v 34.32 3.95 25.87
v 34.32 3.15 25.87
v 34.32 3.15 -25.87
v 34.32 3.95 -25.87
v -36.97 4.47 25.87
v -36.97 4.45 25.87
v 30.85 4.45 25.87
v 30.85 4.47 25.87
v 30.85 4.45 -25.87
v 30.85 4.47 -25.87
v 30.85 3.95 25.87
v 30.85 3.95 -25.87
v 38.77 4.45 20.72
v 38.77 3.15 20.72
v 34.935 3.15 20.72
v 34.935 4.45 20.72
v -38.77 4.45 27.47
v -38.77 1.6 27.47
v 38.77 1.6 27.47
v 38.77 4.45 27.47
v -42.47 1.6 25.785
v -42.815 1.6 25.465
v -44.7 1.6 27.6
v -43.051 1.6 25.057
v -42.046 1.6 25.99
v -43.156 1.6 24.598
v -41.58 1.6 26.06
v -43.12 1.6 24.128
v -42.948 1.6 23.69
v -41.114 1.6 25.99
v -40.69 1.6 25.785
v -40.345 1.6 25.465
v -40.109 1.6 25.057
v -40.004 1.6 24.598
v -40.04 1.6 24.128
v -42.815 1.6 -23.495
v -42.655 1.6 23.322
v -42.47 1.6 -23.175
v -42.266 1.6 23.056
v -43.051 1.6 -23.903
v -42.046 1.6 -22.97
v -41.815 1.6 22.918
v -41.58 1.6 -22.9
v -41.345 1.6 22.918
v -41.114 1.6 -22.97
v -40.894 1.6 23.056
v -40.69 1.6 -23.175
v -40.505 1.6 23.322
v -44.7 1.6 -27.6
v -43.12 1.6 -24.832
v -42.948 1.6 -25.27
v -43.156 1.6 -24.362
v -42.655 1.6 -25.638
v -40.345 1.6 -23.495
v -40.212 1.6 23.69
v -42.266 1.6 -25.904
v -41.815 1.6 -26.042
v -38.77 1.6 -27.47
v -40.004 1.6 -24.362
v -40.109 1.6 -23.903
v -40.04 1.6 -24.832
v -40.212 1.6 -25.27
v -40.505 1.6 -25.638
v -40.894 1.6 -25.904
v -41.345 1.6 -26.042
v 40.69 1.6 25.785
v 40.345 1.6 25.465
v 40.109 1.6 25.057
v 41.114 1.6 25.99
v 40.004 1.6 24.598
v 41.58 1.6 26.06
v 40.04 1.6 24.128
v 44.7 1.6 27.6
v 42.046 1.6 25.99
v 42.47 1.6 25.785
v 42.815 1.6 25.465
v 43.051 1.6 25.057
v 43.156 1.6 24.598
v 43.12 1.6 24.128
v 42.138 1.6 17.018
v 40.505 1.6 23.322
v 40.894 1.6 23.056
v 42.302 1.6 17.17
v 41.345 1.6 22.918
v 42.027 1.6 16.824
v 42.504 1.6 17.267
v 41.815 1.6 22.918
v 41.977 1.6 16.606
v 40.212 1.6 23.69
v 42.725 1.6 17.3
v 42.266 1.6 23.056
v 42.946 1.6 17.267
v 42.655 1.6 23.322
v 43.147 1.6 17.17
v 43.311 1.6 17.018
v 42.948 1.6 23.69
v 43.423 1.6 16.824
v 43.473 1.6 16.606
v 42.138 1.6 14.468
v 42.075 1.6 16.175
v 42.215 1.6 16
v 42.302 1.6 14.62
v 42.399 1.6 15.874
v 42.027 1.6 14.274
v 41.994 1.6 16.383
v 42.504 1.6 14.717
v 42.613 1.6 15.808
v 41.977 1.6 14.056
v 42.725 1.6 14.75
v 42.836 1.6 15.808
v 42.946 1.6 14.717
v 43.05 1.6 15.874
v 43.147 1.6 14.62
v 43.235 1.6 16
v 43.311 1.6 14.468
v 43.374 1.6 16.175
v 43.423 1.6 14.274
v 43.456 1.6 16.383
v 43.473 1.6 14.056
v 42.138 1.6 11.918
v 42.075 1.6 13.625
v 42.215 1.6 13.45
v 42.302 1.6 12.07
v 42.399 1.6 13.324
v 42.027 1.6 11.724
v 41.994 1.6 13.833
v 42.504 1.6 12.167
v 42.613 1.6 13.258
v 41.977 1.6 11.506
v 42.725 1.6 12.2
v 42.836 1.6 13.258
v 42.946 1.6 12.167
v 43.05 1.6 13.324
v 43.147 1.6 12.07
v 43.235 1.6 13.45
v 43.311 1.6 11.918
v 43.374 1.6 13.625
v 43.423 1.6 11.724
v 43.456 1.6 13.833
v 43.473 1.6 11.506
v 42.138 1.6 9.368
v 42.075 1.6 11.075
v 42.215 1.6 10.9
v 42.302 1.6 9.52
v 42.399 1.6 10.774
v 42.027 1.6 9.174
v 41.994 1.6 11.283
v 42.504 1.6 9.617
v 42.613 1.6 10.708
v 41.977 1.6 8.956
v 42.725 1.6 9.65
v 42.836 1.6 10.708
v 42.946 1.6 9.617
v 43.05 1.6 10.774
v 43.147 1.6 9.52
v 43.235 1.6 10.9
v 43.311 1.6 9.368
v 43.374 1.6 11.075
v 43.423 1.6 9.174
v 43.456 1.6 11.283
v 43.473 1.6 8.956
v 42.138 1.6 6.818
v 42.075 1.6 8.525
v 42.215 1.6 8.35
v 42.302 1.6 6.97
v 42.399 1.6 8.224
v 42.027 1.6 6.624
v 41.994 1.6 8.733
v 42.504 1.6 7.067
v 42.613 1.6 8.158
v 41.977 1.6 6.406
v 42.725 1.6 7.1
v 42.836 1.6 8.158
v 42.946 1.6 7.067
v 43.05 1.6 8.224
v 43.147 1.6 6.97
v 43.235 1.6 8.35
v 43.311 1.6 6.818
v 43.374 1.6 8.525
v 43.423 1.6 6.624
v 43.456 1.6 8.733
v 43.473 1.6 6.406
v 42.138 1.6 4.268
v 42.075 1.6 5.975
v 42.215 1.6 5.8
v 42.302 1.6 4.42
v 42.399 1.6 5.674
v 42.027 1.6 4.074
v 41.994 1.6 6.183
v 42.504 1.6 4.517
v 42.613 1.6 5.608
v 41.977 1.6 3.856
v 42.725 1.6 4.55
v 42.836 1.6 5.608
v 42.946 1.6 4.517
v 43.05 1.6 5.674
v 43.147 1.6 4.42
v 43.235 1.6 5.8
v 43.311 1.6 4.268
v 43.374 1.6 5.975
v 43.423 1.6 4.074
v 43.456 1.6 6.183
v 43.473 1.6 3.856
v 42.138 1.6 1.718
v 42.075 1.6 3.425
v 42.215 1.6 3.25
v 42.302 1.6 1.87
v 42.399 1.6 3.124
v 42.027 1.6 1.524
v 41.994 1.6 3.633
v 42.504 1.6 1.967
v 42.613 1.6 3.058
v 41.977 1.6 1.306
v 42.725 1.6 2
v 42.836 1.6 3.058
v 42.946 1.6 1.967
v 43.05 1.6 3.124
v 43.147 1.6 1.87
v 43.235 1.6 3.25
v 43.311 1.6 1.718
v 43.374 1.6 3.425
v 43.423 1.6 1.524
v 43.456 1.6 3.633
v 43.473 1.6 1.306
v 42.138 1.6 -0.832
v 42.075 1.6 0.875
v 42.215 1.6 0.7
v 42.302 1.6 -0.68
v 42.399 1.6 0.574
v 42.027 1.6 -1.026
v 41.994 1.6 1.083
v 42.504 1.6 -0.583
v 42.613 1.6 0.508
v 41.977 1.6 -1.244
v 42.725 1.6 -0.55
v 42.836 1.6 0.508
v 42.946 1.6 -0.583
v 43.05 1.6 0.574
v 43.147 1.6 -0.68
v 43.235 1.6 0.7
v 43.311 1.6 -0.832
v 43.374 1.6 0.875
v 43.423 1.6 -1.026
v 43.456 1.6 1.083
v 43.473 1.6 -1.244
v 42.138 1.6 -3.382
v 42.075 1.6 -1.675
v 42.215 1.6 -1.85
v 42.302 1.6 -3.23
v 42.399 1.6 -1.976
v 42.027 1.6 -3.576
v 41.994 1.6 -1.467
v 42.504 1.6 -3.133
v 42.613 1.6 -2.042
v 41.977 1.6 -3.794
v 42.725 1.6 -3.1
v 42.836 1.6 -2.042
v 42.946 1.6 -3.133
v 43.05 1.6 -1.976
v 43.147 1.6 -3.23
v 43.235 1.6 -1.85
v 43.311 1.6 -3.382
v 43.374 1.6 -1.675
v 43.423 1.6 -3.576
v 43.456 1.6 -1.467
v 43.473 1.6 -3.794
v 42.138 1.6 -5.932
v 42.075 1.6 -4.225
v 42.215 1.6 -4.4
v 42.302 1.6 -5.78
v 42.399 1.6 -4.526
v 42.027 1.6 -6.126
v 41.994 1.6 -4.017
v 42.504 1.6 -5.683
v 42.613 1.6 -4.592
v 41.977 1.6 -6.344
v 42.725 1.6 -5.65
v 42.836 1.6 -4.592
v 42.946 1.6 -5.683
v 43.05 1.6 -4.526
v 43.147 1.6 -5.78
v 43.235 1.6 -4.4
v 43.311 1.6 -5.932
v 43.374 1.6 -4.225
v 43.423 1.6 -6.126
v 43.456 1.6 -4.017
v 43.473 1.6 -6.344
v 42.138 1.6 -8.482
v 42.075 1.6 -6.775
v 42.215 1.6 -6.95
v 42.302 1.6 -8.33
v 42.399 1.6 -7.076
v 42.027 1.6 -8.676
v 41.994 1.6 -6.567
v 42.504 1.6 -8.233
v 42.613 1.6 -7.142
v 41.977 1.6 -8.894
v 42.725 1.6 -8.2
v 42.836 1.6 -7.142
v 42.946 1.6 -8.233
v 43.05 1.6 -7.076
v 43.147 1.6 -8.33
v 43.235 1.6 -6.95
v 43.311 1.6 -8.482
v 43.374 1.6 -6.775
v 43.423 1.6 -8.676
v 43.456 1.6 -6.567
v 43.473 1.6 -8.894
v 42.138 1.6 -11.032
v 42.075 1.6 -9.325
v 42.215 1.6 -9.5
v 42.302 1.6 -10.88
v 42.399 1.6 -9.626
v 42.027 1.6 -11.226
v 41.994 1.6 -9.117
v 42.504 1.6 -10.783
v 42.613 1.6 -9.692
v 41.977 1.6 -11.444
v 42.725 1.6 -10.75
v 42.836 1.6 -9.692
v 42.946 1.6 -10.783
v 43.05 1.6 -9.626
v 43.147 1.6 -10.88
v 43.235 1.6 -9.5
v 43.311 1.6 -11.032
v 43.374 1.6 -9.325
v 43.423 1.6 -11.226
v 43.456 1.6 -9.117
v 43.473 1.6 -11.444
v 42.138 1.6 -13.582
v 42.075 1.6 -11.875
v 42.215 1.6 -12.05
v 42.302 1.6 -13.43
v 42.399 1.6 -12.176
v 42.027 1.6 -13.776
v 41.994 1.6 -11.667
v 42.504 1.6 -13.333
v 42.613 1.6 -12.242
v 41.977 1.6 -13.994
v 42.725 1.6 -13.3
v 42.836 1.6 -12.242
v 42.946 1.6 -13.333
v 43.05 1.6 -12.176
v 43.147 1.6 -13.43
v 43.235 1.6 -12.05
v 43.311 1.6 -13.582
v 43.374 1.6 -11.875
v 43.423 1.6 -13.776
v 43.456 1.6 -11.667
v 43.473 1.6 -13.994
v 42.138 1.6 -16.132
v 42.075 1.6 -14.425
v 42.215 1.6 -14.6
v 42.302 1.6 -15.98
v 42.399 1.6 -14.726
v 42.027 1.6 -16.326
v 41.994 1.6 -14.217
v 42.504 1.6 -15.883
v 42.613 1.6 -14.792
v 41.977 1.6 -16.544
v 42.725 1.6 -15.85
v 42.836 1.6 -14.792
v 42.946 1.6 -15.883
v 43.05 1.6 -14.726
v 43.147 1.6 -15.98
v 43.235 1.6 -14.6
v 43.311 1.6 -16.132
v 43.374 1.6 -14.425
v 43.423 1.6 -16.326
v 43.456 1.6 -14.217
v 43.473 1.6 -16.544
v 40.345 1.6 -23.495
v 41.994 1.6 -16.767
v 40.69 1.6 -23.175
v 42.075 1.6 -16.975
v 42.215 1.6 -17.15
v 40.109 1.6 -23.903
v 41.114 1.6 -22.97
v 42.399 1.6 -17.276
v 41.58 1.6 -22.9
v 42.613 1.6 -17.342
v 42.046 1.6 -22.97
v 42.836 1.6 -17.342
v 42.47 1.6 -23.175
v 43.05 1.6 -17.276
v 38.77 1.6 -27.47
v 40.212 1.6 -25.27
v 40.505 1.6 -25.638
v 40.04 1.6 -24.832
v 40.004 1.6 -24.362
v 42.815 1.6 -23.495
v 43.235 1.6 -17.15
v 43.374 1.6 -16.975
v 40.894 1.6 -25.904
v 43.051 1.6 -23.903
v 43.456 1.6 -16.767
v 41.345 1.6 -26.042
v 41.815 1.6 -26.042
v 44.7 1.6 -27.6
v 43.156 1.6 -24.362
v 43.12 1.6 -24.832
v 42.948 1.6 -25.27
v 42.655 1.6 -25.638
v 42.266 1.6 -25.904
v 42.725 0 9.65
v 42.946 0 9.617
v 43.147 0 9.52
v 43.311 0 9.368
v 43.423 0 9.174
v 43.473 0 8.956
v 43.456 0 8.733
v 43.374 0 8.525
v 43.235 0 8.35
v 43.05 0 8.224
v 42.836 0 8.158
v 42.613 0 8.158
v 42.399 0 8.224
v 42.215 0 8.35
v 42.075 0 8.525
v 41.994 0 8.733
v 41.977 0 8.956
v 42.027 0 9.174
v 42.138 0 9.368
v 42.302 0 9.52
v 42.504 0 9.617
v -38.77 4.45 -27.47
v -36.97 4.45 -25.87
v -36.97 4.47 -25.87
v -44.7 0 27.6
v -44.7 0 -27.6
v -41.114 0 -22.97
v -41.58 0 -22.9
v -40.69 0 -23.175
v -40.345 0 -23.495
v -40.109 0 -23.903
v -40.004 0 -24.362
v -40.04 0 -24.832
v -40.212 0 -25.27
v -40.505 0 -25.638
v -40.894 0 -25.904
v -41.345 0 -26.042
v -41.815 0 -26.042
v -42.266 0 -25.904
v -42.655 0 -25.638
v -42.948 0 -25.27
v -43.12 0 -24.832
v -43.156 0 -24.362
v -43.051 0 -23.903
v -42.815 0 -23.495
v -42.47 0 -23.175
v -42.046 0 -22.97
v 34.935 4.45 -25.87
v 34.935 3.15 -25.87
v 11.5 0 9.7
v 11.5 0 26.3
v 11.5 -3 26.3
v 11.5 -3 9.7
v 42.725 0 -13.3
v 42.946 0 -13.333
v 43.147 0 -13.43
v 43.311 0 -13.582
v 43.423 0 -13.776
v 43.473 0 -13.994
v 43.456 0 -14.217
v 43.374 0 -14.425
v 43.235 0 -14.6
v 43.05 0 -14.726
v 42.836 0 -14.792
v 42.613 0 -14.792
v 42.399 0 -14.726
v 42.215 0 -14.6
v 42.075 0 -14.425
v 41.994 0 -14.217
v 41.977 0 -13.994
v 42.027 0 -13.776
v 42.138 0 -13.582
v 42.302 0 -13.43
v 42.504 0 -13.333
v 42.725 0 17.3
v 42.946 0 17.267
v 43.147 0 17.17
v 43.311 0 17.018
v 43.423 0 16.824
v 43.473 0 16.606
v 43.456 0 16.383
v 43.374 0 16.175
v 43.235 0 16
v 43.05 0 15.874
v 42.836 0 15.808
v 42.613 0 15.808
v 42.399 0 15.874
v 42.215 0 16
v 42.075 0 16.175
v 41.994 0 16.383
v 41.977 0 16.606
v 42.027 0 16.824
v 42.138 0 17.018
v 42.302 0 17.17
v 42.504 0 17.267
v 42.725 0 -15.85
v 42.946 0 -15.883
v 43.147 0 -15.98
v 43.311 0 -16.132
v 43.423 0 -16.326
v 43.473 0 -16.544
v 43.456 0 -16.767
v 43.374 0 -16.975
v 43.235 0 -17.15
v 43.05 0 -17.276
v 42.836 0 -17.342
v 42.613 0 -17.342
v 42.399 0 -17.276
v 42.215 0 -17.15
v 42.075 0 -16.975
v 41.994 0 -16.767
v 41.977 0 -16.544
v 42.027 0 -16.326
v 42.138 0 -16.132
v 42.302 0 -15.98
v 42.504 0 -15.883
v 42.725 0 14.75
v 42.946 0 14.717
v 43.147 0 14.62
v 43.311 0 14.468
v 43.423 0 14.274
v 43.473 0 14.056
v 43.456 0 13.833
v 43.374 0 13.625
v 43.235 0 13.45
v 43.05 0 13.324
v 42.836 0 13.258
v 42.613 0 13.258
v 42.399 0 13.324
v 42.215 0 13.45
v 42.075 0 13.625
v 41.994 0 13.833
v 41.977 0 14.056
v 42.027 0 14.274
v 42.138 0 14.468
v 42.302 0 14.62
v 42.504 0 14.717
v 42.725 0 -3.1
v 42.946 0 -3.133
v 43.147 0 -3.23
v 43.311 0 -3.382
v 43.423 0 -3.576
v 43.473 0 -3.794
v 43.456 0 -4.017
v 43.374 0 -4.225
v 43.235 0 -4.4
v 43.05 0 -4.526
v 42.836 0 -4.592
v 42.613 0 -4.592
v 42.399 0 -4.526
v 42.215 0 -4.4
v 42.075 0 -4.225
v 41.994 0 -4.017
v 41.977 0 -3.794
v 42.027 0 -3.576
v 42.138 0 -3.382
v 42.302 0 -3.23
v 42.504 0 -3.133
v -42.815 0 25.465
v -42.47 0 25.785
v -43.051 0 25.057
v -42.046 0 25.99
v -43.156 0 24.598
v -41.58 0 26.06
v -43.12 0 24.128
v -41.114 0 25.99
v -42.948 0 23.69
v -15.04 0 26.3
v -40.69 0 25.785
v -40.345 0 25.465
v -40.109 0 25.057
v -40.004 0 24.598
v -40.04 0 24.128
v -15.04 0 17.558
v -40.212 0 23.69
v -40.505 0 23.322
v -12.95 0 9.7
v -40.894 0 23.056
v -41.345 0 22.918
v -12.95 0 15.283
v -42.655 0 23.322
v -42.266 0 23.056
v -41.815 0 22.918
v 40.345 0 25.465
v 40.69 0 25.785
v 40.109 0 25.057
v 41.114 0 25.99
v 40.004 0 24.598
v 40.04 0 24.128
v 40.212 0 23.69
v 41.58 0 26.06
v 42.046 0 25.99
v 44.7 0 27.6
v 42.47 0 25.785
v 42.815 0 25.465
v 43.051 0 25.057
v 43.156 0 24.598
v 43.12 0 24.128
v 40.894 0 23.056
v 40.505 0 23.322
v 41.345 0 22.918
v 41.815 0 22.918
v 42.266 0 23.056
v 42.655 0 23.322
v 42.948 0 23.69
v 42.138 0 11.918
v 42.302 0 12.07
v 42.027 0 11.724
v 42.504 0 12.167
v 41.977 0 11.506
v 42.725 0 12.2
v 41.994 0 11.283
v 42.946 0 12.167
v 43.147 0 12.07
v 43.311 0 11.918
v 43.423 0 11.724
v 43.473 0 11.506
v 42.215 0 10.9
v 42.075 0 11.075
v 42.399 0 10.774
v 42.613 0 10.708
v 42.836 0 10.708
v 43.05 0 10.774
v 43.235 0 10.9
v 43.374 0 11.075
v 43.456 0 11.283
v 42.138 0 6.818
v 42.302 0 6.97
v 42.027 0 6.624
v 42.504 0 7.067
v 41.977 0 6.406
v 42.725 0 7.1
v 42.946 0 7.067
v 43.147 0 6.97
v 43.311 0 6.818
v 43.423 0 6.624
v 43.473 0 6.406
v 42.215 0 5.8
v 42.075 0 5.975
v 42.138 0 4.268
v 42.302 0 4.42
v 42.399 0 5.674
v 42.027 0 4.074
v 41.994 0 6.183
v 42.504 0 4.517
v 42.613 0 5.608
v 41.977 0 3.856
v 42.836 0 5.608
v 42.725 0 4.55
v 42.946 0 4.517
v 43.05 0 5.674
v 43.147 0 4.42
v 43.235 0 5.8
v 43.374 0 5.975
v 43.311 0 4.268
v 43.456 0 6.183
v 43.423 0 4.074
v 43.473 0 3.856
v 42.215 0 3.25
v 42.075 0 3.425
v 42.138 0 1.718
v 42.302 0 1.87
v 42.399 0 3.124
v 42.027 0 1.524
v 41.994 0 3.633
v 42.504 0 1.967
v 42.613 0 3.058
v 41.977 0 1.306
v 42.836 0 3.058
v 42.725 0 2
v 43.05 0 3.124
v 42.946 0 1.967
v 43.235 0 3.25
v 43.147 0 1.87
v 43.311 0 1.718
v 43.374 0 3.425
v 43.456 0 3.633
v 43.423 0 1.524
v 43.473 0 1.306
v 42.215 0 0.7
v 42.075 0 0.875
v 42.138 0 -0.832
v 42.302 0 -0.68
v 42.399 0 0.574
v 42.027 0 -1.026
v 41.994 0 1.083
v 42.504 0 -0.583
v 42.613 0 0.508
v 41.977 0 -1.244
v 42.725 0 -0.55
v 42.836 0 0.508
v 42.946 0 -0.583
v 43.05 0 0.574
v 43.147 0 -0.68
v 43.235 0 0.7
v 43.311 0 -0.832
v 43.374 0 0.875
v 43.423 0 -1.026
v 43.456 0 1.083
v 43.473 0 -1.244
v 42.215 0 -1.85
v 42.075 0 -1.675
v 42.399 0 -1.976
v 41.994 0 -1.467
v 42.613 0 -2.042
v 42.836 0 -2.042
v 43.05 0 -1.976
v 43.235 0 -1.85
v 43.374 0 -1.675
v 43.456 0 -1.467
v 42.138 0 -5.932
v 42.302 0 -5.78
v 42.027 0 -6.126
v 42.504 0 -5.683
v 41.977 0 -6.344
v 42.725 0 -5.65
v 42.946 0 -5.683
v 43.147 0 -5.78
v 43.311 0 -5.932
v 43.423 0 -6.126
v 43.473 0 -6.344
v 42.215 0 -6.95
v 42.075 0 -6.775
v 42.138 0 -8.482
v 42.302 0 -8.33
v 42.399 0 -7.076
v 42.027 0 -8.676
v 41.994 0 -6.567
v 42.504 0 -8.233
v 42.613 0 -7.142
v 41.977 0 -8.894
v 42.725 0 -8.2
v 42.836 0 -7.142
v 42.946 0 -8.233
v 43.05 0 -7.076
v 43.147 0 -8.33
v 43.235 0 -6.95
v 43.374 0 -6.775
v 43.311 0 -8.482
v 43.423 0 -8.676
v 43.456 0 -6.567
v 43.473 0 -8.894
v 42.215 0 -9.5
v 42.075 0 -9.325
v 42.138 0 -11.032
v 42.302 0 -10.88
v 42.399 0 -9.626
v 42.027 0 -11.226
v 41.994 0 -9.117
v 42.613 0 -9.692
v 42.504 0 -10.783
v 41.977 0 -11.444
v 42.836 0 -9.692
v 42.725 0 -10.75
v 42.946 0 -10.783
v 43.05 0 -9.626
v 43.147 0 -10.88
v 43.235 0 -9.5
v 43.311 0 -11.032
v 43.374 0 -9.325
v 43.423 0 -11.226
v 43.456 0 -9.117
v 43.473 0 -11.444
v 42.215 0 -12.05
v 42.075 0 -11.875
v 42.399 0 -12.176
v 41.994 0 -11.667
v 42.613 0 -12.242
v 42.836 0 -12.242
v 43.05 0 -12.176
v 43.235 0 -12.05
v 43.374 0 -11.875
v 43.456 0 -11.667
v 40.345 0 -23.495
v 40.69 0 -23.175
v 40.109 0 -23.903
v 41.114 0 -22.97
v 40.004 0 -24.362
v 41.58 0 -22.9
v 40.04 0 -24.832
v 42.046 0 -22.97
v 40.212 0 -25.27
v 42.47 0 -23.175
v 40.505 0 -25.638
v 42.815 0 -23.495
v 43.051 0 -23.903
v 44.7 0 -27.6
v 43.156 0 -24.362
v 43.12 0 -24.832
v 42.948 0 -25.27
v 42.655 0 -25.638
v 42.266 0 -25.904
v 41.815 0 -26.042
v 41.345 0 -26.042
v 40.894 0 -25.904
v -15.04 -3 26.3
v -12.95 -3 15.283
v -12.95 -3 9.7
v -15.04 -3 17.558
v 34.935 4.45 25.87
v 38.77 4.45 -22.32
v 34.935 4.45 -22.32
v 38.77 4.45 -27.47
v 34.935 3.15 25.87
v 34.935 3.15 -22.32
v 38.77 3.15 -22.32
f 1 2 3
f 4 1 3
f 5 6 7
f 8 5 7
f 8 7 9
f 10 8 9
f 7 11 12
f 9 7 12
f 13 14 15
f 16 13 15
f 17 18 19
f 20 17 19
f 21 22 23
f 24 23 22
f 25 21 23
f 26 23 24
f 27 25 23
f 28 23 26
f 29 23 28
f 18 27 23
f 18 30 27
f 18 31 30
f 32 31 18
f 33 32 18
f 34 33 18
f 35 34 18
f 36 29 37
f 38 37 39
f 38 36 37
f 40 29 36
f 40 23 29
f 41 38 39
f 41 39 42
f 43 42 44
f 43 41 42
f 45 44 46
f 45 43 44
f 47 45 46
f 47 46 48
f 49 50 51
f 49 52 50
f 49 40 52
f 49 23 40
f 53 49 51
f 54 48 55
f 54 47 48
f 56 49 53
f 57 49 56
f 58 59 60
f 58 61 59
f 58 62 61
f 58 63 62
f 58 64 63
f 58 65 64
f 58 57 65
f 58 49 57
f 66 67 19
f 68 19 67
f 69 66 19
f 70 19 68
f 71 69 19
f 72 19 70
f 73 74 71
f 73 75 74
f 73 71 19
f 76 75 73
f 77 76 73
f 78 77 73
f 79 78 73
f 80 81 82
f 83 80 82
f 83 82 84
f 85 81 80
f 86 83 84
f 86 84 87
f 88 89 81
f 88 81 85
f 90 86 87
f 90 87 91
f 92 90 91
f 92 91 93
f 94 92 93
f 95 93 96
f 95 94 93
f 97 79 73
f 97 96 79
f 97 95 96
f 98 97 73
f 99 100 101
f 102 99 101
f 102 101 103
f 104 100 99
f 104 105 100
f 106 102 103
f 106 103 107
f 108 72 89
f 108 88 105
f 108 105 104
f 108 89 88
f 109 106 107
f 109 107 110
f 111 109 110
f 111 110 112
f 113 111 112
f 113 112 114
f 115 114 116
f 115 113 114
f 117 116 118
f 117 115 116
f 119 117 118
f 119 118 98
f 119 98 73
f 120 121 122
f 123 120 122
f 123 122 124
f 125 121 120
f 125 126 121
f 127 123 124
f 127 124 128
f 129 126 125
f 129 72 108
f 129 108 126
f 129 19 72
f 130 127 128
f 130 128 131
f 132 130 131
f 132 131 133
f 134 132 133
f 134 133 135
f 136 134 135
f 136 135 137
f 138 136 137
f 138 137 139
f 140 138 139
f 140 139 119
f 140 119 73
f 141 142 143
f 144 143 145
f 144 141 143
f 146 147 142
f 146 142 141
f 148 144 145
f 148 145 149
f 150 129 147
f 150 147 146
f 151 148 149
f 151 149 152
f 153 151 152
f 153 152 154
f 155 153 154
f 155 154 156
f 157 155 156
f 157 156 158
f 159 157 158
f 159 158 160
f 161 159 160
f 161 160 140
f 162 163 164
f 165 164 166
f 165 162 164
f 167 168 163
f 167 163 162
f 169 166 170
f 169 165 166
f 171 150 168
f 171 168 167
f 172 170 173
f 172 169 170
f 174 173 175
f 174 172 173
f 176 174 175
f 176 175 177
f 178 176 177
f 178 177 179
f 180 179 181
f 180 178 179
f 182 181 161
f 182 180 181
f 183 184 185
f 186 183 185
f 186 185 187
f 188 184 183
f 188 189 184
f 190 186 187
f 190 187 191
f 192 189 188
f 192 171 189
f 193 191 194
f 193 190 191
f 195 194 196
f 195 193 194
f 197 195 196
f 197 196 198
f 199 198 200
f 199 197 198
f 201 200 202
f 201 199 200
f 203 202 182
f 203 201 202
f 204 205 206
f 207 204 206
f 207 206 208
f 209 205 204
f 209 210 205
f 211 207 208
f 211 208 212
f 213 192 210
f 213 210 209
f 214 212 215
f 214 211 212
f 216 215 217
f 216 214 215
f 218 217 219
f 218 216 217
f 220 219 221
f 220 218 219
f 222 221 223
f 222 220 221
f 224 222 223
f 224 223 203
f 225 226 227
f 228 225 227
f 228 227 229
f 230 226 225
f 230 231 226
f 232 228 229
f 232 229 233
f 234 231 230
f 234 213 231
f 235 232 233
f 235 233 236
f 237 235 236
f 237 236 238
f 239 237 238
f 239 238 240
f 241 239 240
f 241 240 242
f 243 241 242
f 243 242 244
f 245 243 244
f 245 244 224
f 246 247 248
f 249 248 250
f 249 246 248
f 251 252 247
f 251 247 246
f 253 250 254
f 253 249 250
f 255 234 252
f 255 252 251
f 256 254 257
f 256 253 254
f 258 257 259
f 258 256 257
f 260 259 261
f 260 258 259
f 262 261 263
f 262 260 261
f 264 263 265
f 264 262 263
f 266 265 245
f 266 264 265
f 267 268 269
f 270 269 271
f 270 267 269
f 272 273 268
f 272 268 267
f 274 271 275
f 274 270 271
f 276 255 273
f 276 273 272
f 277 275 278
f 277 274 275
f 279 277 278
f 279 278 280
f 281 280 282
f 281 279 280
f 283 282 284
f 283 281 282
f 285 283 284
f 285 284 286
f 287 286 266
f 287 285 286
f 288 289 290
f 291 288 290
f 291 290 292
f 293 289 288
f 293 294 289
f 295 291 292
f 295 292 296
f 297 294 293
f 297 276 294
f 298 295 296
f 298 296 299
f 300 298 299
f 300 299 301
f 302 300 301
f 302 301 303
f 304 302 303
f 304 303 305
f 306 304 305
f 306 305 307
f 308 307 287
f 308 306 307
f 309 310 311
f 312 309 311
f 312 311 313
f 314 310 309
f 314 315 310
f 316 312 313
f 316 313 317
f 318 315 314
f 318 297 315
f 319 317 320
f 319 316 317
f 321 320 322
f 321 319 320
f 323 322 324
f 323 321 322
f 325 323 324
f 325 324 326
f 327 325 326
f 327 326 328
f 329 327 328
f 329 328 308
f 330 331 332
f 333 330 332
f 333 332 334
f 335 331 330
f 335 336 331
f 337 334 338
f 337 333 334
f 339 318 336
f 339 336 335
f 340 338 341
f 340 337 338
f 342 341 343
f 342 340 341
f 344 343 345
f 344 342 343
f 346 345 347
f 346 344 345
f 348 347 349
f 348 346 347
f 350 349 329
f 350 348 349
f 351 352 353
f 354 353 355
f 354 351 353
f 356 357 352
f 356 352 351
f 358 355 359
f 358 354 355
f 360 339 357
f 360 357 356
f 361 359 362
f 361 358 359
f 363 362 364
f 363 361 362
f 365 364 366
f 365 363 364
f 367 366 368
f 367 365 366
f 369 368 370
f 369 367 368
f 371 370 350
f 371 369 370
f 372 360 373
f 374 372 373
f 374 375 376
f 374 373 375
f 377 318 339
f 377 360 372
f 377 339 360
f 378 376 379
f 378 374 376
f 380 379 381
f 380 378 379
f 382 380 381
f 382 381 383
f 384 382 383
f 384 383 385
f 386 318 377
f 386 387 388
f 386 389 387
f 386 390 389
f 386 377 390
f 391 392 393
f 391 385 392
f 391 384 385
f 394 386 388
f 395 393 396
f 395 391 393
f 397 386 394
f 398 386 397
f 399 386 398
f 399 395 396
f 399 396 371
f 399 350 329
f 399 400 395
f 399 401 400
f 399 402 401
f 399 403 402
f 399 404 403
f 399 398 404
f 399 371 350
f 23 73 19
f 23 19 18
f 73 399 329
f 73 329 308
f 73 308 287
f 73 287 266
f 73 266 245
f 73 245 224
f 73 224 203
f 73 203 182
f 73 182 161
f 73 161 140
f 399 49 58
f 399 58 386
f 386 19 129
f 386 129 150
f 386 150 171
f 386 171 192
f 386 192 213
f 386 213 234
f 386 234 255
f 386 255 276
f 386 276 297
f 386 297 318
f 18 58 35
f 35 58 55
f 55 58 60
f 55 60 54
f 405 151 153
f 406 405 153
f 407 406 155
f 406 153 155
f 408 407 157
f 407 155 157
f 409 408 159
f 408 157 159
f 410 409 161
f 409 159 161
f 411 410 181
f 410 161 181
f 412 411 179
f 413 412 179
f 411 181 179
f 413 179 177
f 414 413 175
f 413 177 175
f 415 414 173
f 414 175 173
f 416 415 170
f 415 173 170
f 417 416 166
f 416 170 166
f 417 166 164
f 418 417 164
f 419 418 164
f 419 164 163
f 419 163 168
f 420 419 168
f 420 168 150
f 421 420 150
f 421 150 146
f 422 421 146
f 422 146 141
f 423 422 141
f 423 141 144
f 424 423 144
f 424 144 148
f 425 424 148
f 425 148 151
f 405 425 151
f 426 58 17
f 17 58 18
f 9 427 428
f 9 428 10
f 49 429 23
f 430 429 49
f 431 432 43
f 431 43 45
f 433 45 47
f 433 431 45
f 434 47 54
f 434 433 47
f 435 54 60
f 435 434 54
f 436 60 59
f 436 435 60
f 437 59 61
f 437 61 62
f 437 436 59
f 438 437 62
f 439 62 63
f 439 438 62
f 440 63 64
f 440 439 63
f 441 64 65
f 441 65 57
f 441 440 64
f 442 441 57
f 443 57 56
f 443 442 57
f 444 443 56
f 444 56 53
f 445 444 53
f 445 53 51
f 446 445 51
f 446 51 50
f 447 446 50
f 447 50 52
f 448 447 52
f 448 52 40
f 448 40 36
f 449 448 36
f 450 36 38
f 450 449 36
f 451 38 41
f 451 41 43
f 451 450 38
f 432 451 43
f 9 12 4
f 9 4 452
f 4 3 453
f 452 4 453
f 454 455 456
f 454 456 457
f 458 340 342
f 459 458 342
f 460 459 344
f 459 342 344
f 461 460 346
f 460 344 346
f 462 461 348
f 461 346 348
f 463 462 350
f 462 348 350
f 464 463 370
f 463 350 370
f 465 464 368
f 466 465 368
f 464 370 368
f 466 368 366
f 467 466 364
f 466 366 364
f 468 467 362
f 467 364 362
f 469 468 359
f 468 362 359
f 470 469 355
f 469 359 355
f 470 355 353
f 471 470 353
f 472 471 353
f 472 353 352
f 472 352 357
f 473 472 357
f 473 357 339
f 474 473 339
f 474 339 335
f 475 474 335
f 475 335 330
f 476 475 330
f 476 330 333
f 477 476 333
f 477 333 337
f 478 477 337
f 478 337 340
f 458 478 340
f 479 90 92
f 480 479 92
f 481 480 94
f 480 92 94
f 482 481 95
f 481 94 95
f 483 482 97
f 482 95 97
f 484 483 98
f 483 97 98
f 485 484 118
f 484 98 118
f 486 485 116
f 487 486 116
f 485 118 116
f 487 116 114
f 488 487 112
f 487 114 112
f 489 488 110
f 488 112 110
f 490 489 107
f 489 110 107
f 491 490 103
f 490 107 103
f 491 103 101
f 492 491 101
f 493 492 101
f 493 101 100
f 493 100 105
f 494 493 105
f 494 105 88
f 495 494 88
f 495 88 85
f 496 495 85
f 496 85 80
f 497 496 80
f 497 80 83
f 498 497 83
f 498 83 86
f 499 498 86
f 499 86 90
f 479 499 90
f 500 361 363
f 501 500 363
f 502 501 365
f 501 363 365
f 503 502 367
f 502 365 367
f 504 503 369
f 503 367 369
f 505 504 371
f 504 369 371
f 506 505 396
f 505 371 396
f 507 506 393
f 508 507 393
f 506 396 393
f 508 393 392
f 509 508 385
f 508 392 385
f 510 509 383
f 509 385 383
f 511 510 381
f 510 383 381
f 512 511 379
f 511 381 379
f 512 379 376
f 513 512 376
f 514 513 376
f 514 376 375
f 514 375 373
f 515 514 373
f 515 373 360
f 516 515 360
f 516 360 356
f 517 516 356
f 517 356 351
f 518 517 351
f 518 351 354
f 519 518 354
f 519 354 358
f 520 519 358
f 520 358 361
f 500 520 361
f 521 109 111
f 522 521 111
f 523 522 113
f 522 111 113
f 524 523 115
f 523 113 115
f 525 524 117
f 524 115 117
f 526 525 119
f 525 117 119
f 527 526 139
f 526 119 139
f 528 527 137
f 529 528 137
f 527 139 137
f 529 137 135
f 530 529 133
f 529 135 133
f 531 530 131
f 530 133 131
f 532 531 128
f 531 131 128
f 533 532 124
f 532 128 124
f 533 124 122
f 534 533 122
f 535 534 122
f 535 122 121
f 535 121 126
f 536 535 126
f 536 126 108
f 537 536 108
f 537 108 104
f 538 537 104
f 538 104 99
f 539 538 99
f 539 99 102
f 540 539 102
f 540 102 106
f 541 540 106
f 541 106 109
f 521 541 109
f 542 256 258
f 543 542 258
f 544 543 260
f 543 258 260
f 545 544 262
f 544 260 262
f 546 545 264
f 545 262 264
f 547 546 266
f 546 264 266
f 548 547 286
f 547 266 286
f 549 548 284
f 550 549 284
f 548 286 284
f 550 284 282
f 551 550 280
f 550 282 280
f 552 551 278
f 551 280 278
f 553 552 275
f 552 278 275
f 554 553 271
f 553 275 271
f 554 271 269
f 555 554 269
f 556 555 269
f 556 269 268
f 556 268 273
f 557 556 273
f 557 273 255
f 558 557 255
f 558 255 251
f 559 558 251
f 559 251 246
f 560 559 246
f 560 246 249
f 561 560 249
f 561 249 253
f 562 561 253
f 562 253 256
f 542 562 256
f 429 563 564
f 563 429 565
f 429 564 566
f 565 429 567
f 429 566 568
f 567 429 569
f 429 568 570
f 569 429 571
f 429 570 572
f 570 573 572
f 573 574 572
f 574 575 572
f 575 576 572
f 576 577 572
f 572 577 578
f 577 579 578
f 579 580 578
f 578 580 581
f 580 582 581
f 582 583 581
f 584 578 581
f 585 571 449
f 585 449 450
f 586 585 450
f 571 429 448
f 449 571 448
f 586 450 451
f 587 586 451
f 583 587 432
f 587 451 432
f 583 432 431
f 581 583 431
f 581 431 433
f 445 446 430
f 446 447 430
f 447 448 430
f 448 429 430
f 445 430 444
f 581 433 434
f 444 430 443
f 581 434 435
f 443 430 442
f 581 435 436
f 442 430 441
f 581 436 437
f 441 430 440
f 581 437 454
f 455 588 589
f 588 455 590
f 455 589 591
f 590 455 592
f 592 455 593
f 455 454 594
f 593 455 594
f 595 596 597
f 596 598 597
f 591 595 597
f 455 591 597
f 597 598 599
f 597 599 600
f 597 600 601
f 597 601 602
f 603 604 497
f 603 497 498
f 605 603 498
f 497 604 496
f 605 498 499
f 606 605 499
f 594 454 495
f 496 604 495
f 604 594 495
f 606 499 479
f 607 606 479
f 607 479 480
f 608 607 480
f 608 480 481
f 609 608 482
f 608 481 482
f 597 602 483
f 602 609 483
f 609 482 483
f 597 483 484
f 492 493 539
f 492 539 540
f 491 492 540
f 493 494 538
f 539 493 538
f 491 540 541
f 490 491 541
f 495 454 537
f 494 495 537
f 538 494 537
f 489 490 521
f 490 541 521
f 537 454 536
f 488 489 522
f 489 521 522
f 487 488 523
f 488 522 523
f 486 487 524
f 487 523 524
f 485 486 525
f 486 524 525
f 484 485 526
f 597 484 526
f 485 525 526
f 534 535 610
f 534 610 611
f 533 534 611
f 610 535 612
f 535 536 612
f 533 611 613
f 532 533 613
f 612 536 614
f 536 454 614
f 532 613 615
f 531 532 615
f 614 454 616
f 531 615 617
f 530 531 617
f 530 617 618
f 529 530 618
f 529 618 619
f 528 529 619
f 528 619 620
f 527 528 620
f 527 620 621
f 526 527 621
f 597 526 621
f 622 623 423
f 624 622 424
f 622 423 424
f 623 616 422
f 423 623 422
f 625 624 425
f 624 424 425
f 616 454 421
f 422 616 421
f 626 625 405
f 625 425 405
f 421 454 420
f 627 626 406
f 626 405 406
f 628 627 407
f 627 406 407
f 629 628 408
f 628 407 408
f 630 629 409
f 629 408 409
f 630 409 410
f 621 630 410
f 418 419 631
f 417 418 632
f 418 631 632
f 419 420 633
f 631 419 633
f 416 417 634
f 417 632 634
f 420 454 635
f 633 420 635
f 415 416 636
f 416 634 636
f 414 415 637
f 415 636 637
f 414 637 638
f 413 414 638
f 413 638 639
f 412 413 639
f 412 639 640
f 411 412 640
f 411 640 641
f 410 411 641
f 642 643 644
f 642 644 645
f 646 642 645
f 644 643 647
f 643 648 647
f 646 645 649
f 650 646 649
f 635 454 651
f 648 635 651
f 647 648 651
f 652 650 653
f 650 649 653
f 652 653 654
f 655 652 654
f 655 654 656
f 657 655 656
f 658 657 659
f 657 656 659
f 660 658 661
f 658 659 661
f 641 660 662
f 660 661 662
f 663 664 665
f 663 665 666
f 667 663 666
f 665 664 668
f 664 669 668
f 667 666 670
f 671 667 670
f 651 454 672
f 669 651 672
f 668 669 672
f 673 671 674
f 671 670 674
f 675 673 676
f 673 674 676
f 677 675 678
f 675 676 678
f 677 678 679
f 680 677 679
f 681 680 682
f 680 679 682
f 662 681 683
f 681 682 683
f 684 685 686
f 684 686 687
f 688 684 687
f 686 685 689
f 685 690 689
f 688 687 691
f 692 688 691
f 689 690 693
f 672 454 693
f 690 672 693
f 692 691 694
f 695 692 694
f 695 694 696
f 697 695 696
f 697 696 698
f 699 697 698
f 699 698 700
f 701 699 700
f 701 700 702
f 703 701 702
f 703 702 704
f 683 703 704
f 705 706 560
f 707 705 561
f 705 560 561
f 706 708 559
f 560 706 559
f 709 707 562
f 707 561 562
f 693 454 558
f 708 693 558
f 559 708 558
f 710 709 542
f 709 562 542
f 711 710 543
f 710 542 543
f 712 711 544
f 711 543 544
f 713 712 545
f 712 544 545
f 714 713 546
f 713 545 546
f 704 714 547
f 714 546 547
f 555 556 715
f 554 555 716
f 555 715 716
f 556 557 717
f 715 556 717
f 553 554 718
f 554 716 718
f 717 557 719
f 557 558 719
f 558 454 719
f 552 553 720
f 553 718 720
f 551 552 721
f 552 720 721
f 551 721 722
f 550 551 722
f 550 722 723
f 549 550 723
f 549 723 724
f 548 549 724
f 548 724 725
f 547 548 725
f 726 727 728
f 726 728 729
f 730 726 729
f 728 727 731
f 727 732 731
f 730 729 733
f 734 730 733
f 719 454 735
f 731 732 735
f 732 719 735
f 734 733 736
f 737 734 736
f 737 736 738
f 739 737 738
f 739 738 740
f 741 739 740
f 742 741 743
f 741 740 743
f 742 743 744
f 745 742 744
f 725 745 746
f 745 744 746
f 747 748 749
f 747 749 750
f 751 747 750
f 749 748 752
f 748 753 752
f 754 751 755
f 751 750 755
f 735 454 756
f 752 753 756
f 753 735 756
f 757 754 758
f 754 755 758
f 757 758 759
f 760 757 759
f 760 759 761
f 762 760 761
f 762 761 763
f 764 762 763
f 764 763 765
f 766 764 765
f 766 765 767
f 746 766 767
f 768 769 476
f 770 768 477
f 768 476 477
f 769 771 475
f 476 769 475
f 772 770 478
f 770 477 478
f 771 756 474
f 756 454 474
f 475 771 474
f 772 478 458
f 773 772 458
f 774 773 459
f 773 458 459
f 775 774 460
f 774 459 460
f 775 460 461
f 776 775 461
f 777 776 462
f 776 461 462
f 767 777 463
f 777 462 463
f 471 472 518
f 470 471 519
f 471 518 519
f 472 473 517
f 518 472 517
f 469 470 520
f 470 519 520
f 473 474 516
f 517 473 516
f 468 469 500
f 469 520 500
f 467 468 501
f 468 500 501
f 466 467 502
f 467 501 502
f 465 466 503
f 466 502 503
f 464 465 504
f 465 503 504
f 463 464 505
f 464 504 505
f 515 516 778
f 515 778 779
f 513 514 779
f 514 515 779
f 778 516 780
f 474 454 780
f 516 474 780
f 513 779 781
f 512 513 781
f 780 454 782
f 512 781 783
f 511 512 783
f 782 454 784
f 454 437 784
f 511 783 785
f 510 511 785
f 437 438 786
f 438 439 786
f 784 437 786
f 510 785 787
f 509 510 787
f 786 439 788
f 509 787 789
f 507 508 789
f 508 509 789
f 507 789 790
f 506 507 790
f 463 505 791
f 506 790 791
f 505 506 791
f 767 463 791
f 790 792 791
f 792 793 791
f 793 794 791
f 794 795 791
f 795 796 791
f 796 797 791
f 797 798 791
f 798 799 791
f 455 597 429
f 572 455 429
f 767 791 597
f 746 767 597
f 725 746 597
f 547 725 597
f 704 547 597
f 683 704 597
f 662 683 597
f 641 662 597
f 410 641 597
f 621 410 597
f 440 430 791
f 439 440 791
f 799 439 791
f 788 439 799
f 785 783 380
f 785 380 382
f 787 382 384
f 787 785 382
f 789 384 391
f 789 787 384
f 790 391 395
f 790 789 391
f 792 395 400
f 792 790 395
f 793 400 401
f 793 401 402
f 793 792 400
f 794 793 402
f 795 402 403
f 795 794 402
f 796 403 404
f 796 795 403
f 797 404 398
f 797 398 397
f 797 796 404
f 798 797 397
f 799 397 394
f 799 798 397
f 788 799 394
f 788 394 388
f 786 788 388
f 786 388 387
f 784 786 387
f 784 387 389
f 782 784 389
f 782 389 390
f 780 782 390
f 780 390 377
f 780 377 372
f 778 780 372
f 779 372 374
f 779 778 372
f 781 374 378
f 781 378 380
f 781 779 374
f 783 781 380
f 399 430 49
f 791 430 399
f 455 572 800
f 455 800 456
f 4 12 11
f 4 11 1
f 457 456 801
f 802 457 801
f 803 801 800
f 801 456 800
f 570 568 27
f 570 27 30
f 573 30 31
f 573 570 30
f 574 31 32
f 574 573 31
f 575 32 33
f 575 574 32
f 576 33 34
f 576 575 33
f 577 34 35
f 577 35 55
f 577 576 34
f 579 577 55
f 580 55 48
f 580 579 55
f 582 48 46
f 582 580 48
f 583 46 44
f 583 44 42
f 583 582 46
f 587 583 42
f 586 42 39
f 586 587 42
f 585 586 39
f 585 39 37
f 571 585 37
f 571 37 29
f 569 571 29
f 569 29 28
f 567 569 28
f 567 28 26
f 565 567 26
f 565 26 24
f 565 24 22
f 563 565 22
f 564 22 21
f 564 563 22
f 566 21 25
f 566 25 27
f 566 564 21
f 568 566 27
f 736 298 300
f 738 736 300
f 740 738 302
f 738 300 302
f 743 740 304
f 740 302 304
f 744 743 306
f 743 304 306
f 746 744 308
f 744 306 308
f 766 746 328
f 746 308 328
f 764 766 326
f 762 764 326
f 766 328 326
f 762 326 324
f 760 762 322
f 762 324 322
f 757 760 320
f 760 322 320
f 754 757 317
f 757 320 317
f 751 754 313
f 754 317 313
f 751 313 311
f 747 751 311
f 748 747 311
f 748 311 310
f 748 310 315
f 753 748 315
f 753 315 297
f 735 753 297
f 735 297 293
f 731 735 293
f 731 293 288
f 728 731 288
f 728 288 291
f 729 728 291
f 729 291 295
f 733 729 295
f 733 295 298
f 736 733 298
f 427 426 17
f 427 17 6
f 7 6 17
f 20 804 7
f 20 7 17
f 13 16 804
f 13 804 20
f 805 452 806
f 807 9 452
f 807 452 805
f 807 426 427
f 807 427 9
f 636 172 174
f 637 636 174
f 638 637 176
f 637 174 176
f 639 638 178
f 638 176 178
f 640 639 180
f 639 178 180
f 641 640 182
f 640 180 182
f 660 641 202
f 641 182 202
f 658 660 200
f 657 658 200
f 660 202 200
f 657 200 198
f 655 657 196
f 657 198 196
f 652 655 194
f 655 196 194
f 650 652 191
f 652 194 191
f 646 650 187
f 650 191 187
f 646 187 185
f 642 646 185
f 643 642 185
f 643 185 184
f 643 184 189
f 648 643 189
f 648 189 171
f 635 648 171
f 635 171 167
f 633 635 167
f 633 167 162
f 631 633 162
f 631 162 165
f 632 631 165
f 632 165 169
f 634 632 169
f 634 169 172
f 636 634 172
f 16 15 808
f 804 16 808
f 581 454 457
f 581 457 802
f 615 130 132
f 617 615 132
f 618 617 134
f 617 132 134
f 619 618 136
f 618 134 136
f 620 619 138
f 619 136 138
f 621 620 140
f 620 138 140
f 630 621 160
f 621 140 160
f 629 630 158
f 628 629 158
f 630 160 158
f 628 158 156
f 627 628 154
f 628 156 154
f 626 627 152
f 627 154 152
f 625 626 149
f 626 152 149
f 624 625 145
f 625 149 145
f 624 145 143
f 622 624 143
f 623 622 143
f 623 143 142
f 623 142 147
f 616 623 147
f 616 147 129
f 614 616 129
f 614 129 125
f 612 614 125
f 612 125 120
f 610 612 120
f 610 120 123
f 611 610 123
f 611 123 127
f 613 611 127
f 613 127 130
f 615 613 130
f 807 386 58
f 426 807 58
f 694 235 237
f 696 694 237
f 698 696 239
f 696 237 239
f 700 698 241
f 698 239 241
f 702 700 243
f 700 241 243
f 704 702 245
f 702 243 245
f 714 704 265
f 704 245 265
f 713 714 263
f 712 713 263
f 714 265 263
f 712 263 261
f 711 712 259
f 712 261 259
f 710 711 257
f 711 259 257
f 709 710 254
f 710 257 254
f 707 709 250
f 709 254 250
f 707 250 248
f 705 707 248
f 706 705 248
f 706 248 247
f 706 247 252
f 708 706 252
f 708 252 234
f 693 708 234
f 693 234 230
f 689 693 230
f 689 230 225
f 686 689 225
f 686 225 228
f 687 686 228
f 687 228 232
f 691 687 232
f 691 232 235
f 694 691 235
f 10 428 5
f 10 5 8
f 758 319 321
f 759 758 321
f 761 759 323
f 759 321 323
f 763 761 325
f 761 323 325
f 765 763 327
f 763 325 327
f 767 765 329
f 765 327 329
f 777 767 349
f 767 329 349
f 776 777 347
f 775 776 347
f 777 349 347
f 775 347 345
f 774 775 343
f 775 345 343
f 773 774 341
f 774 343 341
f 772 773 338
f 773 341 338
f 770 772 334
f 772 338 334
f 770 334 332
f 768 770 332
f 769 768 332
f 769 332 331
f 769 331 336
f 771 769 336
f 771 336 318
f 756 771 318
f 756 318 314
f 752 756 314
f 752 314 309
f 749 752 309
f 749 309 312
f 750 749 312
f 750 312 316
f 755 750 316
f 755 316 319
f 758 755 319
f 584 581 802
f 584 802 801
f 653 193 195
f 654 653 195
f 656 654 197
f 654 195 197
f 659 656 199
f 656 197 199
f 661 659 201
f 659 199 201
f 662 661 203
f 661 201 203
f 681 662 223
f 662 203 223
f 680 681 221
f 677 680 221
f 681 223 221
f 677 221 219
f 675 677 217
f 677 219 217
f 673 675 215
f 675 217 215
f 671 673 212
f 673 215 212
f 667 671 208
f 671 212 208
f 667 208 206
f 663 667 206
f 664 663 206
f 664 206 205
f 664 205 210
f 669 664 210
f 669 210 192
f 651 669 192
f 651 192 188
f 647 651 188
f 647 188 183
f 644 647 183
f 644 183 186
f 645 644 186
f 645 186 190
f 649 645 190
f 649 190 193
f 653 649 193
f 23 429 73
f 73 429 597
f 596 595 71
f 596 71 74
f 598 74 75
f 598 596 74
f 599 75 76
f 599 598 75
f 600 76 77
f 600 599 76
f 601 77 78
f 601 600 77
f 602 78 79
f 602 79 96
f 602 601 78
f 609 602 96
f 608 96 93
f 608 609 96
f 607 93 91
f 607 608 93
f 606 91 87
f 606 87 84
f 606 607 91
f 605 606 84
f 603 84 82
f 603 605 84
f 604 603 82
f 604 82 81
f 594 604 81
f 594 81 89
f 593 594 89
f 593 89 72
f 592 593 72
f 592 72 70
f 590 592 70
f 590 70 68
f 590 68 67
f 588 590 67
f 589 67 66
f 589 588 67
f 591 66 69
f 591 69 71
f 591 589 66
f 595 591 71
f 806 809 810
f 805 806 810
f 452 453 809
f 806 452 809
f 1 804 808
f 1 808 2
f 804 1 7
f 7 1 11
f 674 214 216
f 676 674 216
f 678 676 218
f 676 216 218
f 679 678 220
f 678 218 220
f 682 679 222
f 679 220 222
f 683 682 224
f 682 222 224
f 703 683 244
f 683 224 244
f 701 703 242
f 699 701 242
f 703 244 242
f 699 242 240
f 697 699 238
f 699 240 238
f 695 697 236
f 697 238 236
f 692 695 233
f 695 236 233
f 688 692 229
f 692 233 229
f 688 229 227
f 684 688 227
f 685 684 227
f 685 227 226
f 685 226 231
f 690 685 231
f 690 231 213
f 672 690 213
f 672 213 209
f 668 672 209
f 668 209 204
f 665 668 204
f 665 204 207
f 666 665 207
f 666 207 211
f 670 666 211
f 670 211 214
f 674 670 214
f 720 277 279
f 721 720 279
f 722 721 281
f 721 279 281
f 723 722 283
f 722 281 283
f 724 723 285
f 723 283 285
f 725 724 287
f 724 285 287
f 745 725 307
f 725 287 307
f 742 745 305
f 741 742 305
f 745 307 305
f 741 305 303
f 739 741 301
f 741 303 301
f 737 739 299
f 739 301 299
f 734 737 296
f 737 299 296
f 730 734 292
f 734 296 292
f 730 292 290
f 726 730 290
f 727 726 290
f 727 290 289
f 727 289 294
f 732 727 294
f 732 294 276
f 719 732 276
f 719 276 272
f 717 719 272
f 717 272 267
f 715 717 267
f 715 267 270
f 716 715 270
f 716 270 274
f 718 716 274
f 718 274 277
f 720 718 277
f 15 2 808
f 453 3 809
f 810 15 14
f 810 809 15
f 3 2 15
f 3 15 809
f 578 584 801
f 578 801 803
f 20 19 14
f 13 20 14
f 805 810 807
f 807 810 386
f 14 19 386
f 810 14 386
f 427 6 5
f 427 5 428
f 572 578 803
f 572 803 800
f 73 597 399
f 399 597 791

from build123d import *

# Parameters (mm, degrees)
ESQUISSE1_W             = 89.4
ESQUISSE1_H             = 55.2
ESQUISSE1_R             = 1.58
PLAQUE_DEPTH            = 1.6
ESQUISSE2_3_W           = 3.47
ESQUISSE2_3_H           = 51.74
NAPPE_DEPTH             = 2.35
BORDURE_DEPTH           = 2.85
ESQUISSE2_W             = 67.82
ESQUISSE2_H             = 51.74
LCD_DEPTH               = 2.87
SUPPORT_DEPTH           = 1.55
CARTE_SD_DEPTH          = 3
ESQUISSE5_R             = 0.75
ENL_V_MAT_EXTRU_1_DEPTH = 53.735282307


with BuildPart() as part:
    # Esquisse1 → Plaque (new body)
    with BuildSketch(Plane(origin=(0, 0, 0), x_dir=(1, 0, 0), z_dir=(0, 1, 0))):
        Rectangle(ESQUISSE1_W, ESQUISSE1_H)
        with Locations((-41.58, 24.48)):
            Circle(ESQUISSE1_R, mode=Mode.SUBTRACT)
        with Locations((41.58, 24.48)):
            Circle(ESQUISSE1_R, mode=Mode.SUBTRACT)
        with Locations((-41.58, -24.48)):
            Circle(ESQUISSE1_R, mode=Mode.SUBTRACT)
        with Locations((41.58, -24.48)):
            Circle(ESQUISSE1_R, mode=Mode.SUBTRACT)
    extrude(amount=PLAQUE_DEPTH)

    # Esquisse2<3> → Nappe (add)
    with BuildSketch(Plane(origin=(0, 1.6, 0), x_dir=(1, 0, 0), z_dir=(0, 1, 0))):
        with Locations((32.585, 0)):
            Rectangle(ESQUISSE2_3_W, ESQUISSE2_3_H)
    extrude(amount=NAPPE_DEPTH)

    # Esquisse2<5> → Bordure (add)
    with BuildSketch(Plane(origin=(0, 1.6, 0), x_dir=(1, 0, 0), z_dir=(0, 1, 0))):
        Polygon((34.934831333, -20.72), (34.934831333, -25.87), (34.32, -25.87), (30.85, -25.87), (-36.97, -25.87), (-36.97, 25.87), (30.85, 25.87), (34.32, 25.87), (34.934831333, 25.87), (34.934831333, 22.32), (38.77, 22.32), (38.77, 27.47), (-38.77, 27.47), (-38.77, -27.47), (38.77, -27.47), (38.77, -20.72), align=None)
    extrude(amount=BORDURE_DEPTH)

    # Esquisse2 → LCD (add)
    with BuildSketch(Plane(origin=(0, 1.6, 0), x_dir=(1, 0, 0), z_dir=(0, 1, 0))):
        with Locations((-3.06, 0)):
            Rectangle(ESQUISSE2_W, ESQUISSE2_H)
    extrude(amount=LCD_DEPTH)

    # Esquisse2<8> → Support (add)
    with BuildSketch(Plane(origin=(0, 1.6, 0), x_dir=(1, 0, 0), z_dir=(0, 1, 0))):
        Polygon((34.32, -25.87), (34.934831333, -25.87), (34.934831333, -20.72), (38.77, -20.72), (38.77, 22.32), (34.934831333, 22.32), (34.934831333, 25.87), (34.32, 25.87), align=None)
    extrude(amount=SUPPORT_DEPTH)

    # Esquisse4 → Carte SD (add)
    with BuildSketch(Plane.XZ):
        Polygon((-15.04, 26.3), (11.5, 26.3), (11.5, 9.7), (-12.95, 9.7), (-12.95, 15.282856636), (-15.04, 17.558065393), align=None)
    extrude(amount=CARTE_SD_DEPTH)

    # Esquisse5 → Enlèv. mat.-Extru.1 (cut, through all)
    with BuildSketch(Plane(origin=(0, 1.6, 0), x_dir=(1, 0, 0), z_dir=(0, 1, 0))):
        with Locations((42.724707786, 16.6)):
            Circle(ESQUISSE5_R)
        with Locations((42.724707786, 14.05)):
            Circle(ESQUISSE5_R)
        with Locations((42.724707786, 11.5)):
            Circle(ESQUISSE5_R)
        with Locations((42.724707786, 8.95)):
            Circle(ESQUISSE5_R)
        with Locations((42.724707786, 6.4)):
            Circle(ESQUISSE5_R)
        with Locations((42.724707786, 3.85)):
            Circle(ESQUISSE5_R)
        with Locations((42.724707786, 1.3)):
            Circle(ESQUISSE5_R)
        with Locations((42.724707786, -1.25)):
            Circle(ESQUISSE5_R)
        with Locations((42.724707786, -3.8)):
            Circle(ESQUISSE5_R)
        with Locations((42.724707786, -6.35)):
            Circle(ESQUISSE5_R)
        with Locations((42.724707786, -8.9)):
            Circle(ESQUISSE5_R)
        with Locations((42.724707786, -11.45)):
            Circle(ESQUISSE5_R)
        with Locations((42.724707786, -14)):
            Circle(ESQUISSE5_R)
        with Locations((42.724707786, -16.55)):
            Circle(ESQUISSE5_R)
    extrude(amount=-ENL_V_MAT_EXTRU_1_DEPTH, mode=Mode.SUBTRACT)


solid = part.part
